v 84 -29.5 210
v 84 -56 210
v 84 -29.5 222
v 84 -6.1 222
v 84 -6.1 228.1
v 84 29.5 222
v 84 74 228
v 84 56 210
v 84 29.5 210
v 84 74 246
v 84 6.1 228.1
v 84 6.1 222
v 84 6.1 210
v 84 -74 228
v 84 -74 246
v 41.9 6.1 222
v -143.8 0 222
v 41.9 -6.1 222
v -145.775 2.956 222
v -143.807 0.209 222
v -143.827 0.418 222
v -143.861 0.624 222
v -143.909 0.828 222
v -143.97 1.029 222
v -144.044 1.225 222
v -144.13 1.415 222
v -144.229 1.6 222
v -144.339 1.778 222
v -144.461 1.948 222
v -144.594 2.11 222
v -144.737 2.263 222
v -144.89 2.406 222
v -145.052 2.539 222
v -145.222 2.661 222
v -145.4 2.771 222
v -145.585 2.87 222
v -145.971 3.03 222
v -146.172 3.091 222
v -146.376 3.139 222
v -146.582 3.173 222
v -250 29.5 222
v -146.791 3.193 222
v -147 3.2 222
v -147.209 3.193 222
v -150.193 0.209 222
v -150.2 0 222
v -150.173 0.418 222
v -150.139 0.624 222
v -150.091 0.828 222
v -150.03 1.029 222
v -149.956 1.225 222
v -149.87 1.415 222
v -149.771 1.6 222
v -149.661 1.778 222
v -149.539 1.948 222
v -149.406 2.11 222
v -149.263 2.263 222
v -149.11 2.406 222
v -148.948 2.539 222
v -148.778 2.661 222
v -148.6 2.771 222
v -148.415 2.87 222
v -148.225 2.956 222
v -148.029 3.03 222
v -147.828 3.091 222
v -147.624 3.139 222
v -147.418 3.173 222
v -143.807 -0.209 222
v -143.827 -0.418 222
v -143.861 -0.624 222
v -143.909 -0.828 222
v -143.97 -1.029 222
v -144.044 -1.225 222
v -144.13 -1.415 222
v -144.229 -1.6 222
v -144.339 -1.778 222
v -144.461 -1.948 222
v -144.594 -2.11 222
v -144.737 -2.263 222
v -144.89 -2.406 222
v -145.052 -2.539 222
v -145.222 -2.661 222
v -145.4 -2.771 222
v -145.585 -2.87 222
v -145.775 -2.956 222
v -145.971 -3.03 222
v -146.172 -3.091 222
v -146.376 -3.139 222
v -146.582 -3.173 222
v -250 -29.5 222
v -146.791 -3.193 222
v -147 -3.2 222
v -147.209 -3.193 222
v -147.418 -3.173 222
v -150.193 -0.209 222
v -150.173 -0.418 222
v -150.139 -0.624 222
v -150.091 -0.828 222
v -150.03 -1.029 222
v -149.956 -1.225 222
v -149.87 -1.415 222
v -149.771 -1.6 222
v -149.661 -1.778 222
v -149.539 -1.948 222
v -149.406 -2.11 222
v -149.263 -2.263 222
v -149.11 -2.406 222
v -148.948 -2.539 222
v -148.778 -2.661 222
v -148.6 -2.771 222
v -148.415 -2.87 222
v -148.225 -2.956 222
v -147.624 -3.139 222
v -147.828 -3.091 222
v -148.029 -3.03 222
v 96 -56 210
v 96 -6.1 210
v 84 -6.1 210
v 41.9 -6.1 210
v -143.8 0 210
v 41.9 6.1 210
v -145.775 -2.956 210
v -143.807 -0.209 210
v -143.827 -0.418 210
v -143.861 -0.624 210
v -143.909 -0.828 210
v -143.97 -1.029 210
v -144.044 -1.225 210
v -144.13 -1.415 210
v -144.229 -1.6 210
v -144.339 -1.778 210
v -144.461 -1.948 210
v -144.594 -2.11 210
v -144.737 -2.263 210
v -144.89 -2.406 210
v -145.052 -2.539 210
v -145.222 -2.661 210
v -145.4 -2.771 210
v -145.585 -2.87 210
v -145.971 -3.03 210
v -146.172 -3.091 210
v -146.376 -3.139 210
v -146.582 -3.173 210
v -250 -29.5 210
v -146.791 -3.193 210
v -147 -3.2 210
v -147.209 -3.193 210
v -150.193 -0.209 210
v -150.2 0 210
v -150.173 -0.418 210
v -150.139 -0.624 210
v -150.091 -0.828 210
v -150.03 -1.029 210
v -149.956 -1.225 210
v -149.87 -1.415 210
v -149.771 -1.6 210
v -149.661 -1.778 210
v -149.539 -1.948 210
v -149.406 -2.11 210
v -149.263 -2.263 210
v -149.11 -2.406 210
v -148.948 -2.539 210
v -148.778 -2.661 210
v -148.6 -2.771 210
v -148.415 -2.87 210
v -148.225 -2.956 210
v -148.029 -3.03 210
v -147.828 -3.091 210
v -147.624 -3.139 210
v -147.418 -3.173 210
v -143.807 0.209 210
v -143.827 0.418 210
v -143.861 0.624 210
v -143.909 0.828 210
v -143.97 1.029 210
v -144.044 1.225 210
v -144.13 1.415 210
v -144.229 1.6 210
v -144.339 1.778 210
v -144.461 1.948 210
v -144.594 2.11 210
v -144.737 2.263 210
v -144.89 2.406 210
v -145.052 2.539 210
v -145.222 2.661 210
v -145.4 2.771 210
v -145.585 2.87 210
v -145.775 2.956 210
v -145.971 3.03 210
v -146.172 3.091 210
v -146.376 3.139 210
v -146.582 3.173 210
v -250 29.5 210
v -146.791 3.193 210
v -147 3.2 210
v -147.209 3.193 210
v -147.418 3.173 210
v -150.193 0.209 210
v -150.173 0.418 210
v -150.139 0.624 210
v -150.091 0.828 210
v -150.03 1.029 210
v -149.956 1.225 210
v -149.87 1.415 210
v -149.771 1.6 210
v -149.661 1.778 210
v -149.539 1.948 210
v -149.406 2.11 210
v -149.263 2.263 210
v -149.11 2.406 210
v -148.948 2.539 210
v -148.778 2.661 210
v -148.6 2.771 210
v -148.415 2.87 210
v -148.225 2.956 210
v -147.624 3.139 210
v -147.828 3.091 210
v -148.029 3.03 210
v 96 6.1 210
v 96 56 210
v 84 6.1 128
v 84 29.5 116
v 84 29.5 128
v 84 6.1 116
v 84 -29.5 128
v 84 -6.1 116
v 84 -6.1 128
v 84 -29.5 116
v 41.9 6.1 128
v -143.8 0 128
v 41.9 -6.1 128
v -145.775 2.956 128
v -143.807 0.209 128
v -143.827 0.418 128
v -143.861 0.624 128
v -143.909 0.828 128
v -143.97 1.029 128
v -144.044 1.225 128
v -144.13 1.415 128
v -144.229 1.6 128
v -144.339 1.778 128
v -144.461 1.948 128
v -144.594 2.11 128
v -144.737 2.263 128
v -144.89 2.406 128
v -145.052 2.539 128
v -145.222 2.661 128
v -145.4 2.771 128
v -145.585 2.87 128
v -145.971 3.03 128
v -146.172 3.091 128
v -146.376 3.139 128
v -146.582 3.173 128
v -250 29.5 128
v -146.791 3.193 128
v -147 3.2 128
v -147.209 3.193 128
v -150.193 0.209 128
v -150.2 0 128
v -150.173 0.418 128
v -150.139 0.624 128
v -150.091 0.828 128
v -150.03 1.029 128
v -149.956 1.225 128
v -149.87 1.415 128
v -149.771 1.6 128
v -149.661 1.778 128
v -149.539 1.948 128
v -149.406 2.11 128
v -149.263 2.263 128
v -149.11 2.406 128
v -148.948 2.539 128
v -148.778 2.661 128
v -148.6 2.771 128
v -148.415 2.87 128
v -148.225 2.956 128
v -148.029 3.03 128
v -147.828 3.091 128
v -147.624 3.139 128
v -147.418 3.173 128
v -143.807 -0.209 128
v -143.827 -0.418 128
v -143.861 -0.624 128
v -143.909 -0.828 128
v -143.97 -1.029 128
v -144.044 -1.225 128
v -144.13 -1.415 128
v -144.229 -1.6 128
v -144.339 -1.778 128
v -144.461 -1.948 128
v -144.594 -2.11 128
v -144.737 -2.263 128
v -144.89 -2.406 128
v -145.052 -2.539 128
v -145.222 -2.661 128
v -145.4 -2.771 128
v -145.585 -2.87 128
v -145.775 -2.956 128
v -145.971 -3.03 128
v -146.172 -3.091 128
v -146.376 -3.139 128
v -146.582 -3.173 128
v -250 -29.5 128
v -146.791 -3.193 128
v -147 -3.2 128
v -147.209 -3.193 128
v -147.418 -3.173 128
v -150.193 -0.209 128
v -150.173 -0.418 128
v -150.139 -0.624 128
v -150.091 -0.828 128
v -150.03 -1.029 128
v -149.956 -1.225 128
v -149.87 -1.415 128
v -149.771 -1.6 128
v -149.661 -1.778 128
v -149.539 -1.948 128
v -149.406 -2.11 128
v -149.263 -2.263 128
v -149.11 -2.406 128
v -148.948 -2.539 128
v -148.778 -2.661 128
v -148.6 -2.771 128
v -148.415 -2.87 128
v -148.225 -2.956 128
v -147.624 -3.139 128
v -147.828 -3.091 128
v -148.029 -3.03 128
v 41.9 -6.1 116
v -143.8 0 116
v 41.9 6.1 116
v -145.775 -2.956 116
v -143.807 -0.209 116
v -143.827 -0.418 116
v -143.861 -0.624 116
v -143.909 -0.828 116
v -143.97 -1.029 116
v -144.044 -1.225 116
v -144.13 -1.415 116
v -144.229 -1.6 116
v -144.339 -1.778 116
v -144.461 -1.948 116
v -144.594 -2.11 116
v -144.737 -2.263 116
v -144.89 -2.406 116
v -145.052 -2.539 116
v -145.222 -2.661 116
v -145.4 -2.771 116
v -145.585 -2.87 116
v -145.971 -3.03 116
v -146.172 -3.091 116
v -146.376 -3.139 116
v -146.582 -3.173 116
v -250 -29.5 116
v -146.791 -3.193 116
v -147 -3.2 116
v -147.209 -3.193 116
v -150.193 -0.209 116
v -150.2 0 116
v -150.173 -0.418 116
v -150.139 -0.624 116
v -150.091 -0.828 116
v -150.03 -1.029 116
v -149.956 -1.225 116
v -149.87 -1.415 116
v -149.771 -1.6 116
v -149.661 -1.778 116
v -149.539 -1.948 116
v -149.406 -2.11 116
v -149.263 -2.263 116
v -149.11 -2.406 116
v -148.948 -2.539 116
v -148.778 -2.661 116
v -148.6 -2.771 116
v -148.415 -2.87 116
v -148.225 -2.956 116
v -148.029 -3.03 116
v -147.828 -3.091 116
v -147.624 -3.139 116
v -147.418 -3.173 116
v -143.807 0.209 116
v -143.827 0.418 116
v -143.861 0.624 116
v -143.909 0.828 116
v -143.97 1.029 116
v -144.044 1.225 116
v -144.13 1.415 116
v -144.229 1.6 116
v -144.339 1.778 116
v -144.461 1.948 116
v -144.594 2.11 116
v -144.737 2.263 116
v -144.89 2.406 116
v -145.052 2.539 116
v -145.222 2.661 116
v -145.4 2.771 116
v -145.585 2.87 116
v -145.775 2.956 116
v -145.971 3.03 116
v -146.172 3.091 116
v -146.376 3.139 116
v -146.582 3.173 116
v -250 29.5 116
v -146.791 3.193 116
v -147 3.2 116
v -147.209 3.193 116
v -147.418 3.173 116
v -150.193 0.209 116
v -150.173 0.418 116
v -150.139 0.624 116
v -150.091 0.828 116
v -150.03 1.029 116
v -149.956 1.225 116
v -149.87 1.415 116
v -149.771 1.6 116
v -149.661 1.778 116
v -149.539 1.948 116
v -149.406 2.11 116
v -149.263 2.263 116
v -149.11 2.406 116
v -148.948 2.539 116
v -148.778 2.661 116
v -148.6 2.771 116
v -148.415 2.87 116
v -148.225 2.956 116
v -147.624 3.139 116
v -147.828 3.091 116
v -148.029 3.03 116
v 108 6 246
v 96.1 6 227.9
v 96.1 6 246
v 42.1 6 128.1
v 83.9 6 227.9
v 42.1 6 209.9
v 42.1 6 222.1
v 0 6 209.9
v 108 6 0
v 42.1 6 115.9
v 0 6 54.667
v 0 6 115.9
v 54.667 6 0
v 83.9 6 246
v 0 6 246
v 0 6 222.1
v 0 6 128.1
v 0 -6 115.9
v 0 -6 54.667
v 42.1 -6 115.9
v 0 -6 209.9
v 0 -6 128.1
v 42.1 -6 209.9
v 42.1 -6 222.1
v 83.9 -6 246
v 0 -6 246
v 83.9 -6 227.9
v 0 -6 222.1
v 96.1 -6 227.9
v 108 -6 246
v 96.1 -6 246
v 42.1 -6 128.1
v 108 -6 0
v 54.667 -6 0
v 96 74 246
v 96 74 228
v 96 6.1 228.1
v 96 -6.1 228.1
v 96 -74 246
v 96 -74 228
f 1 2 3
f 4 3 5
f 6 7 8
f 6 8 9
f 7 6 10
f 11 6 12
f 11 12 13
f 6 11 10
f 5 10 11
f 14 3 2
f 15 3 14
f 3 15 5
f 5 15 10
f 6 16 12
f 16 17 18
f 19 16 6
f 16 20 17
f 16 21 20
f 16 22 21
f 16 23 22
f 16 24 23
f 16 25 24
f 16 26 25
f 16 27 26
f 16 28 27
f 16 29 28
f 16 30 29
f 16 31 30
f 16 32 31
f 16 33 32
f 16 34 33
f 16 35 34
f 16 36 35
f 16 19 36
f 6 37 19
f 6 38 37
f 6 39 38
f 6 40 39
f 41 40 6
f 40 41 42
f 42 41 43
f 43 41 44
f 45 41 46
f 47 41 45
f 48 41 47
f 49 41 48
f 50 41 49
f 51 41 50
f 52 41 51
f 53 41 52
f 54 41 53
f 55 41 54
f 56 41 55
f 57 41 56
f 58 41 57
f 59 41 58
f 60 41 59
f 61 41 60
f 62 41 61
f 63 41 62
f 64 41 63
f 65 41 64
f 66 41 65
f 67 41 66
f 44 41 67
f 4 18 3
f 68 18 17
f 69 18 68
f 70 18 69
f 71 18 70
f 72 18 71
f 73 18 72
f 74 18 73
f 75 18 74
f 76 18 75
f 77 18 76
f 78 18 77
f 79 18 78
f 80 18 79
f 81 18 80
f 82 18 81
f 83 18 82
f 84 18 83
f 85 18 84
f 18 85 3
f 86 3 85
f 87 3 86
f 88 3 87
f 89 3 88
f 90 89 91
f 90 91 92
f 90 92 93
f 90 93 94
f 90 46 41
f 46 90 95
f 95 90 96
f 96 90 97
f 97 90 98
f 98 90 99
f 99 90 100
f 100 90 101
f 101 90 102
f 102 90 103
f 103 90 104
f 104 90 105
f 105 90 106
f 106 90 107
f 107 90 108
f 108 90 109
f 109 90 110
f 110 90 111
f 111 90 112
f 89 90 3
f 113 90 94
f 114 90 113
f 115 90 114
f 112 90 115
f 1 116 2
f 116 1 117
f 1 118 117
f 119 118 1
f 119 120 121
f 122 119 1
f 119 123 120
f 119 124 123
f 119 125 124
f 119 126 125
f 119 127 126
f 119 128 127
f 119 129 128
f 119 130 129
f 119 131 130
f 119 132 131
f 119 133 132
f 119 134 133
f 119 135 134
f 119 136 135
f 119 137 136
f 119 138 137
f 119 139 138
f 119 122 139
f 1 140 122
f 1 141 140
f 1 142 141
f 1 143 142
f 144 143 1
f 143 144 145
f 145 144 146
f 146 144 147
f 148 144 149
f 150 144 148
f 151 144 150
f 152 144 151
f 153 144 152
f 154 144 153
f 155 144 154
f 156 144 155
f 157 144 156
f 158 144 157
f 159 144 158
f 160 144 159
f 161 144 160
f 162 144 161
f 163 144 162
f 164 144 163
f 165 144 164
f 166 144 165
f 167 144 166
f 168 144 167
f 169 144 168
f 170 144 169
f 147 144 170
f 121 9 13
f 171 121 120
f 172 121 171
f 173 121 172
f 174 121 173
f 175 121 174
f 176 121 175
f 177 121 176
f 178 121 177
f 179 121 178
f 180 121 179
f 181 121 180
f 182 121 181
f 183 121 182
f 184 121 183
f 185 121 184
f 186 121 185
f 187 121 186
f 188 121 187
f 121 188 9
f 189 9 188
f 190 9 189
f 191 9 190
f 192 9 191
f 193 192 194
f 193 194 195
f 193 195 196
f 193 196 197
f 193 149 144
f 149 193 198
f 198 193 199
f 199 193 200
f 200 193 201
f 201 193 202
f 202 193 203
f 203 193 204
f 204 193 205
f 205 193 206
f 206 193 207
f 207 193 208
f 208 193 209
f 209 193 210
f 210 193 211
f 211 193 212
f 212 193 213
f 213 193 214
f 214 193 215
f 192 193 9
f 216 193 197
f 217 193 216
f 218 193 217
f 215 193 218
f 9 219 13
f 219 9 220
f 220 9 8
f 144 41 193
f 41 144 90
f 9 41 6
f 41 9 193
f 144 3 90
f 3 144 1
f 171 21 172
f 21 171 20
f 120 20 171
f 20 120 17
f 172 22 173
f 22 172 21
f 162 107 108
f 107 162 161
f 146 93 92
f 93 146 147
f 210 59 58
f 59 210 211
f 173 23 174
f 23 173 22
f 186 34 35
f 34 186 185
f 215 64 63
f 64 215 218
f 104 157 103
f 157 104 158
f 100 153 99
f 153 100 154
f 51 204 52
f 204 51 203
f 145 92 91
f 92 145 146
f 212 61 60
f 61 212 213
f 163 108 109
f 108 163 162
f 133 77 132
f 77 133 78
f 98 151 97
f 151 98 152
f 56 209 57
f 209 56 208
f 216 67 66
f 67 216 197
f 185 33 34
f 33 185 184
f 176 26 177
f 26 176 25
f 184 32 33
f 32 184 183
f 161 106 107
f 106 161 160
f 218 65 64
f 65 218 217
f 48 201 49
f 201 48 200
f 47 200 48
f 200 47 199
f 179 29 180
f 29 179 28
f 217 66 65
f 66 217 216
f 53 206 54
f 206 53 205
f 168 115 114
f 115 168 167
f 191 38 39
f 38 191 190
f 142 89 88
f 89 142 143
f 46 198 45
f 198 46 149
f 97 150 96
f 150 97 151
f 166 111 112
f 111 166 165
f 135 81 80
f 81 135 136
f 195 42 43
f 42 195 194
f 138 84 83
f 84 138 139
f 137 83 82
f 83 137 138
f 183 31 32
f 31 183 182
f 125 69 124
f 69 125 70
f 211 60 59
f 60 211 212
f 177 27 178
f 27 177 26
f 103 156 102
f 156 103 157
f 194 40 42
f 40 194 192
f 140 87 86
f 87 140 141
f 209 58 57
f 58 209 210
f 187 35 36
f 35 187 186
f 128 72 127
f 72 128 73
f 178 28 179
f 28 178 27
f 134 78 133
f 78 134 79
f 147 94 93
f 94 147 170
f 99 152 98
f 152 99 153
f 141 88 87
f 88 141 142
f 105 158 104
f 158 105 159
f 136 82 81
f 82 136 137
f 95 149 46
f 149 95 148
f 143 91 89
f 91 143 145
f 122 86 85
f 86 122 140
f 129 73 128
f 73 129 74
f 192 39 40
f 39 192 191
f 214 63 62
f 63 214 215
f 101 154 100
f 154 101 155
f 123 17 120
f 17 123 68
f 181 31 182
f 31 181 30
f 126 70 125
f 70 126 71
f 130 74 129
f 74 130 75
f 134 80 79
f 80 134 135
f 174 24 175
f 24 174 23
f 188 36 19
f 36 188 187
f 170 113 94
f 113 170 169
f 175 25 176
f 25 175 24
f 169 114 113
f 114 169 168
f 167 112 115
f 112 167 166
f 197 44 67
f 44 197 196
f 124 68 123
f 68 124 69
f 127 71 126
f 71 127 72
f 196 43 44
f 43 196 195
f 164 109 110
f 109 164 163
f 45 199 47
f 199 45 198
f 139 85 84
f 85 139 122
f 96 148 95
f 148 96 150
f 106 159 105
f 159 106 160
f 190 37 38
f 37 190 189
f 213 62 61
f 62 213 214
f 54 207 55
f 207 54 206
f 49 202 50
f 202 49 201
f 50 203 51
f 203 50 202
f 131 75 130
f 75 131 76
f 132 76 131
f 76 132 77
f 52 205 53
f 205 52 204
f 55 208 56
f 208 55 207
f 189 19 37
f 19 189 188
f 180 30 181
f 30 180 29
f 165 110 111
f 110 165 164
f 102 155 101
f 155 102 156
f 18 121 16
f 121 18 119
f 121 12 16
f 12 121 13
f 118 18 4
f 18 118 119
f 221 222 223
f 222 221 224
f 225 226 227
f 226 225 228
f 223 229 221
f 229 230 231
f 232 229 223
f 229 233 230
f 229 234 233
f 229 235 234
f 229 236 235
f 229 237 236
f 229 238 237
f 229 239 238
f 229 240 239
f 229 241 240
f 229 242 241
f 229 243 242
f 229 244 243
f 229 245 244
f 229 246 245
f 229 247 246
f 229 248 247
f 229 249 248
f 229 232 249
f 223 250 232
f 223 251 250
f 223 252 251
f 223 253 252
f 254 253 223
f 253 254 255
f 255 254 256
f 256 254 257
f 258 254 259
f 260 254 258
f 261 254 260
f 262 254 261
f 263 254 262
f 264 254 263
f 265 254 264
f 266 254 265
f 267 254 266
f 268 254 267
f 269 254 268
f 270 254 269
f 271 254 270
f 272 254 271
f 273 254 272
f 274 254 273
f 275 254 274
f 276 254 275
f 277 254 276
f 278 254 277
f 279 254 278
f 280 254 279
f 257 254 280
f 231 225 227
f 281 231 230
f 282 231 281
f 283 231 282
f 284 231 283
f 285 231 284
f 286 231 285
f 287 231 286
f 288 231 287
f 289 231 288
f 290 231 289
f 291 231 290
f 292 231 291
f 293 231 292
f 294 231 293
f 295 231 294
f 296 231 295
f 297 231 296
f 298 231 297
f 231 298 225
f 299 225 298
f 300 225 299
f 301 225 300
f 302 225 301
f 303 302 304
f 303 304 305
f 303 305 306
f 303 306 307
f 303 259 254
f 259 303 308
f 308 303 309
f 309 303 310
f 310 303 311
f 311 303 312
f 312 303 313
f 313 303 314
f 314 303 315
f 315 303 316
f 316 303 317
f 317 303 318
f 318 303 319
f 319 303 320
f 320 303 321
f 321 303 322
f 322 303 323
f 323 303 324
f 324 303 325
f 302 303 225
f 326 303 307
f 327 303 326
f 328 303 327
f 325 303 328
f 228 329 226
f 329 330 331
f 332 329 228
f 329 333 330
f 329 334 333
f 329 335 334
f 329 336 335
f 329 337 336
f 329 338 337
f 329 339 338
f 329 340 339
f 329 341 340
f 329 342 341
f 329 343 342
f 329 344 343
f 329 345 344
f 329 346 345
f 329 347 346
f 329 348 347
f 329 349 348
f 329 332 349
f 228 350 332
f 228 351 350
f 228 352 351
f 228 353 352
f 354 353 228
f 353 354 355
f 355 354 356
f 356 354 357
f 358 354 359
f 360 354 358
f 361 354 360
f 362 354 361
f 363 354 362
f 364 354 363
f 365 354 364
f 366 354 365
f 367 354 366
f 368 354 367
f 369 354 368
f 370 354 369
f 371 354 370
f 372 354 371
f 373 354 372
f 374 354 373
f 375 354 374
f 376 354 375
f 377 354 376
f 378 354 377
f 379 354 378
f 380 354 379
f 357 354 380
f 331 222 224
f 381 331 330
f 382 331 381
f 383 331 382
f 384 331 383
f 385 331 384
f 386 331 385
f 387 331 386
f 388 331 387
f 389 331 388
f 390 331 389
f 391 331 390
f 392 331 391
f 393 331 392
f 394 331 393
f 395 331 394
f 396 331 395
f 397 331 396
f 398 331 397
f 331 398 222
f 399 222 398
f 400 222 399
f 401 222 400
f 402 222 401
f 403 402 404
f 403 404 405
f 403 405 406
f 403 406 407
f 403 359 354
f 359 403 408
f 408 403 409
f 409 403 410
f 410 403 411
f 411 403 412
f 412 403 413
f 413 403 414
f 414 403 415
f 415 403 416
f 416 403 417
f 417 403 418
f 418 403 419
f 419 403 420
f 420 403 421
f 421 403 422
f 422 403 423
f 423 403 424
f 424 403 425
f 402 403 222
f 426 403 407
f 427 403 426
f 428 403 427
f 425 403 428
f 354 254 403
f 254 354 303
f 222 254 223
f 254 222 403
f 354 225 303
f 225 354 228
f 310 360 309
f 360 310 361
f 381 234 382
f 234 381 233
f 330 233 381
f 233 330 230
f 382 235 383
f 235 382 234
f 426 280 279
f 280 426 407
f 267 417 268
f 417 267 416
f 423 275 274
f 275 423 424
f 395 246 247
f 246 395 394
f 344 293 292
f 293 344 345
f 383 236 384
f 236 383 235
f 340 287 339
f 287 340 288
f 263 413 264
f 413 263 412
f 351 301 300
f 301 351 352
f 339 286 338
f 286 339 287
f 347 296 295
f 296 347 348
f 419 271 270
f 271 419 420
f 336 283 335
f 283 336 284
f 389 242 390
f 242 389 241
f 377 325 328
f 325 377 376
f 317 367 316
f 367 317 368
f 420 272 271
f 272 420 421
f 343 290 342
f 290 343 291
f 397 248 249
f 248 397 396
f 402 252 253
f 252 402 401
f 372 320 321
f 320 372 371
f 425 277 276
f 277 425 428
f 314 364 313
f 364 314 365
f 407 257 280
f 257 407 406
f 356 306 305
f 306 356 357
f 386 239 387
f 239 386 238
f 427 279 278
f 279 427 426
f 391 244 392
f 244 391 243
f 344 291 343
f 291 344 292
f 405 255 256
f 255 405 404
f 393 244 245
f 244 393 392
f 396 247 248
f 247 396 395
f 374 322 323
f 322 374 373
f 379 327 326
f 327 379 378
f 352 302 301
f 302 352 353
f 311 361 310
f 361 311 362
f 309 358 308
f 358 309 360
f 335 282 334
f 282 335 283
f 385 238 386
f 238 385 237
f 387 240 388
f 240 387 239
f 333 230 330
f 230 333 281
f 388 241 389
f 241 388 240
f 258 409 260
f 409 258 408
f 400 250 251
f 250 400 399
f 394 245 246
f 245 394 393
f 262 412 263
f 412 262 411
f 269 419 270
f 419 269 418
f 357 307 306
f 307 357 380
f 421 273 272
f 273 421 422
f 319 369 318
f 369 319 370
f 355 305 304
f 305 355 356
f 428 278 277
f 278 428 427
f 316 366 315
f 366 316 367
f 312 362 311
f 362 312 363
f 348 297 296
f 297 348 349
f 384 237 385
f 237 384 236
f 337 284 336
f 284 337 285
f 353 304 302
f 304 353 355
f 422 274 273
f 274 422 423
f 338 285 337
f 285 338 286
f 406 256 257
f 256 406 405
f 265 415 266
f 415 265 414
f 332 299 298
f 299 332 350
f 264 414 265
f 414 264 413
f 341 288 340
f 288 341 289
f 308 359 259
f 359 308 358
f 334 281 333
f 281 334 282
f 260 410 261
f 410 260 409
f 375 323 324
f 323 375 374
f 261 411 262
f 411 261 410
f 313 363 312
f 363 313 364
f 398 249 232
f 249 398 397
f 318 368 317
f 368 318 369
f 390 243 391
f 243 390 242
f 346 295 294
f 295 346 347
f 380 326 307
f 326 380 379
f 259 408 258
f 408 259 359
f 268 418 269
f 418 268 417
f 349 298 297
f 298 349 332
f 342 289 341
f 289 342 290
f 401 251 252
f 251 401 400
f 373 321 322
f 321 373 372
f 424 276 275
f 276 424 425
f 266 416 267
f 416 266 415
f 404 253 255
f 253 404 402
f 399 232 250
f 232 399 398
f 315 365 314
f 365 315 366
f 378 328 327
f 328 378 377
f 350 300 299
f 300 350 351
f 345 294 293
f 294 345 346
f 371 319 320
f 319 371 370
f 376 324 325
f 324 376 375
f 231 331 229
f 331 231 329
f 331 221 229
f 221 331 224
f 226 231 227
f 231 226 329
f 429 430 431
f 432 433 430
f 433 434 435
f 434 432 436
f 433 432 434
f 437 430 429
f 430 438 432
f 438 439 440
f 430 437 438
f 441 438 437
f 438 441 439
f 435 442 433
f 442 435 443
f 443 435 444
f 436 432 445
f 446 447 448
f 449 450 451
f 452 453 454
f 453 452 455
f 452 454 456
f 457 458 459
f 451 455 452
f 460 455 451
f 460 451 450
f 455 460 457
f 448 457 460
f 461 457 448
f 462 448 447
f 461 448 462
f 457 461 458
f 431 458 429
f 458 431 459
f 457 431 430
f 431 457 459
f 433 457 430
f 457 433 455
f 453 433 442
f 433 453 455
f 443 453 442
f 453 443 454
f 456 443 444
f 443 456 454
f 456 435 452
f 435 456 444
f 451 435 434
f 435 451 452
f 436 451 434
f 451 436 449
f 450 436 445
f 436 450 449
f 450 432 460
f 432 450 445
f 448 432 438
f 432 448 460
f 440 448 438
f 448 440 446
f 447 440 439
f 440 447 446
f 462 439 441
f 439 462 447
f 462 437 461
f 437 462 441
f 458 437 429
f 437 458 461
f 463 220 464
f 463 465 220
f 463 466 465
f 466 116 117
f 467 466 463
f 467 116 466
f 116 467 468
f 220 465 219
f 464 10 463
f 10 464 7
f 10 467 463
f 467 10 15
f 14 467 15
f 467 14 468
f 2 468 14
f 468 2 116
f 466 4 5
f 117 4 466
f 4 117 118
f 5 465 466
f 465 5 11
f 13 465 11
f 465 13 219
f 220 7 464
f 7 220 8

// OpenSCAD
// ==========================================================================
//  GENERATED FILE -- DO NOT EDIT.
//  Produced by build/build.py from components/Turtle_Rear_Fin_v2.scad
//  Turtle Body version 1.6.0
//  Edit lib/ and src/ instead, then run: python3 build/build.py
// ==========================================================================
/*
 Hope Turtle rear-fin v2. Units: mm. License: CERN-OHL-S-2.0.
 Four wooden pieces: yellow fin, two green bottle-holder shafts, red solar
 crossbar. Panel + bottle are F5 reference only, excluded from F6/STL.
 Shaft length 334. Slot openings 12.2 mm (0.2 mm TOTAL, centred).
 TB-07: green-slat mounting hole is 103 mm from the shaft front, matching
 the assembled Turtle (was a fixed 50 mm).

 SOURCE FILE — geometry lives in lib/rear_fin.scad + lib/params.scad.
 The committed self-contained file is generated by build/build.py.
*/

/* [Fit and tuning] */
half_lap_clearance   = 0.2; // TOTAL extra slot width, centred on the board
solar_slot_clearance = 0.2;
exploded = 0;

/* [Display] */
part = "assembly"; // [assembly,fin,solar_holder,shaft]
show_solar_panel = true;   // F5 reference only, excluded from F6/STL
show_bottle_mockup = false; // reserved

/* [Render] */
fn = 96;

// [bundle] begin use <../../lib/rear_fin.scad>
// ==========================================================================
//  Turtle Body -- rear fin + solar-panel support  (lib module)
// --------------------------------------------------------------------------
//  One yellow vertical fin, two green bottle-holder shafts, one red solar
//  crossbar. In the standalone the panel + bottle are %-reference only and
//  excluded from F6/STL. See CLAUDE.md s11.
//
//  Shaft length keeps the approved formula 305 + (2/3)(93-24) - 17 = 334.
//  Half-lap and solar-joint clearances are 0.2 mm TOTAL, centred on the
//  12 mm board (slot opening 12.2 mm, not 12.4). TB-07: the green-slat
//  mounting hole is p_rear_shaft_hole_from_front() (103 mm at defaults),
//  matching the assembled Turtle -- not the old fixed 50 mm.
//
//  Definitions only. Geometry is emitted by rear_fin_assembly() or the
//  individual part modules.
// ==========================================================================

// [bundle] begin use <params.scad>
// ==========================================================================
//  Turtle Body -- shared dimension contract
// --------------------------------------------------------------------------
//  The single source of truth for every dimension that more than one
//  subsystem depends on. Values are exposed as zero-argument functions so
//  this file can be pulled in with `use <params.scad>` (which ignores
//  top-level variable assignments) without polluting any namespace.
//
//  lib/ modules take these as DEFAULT argument values:
//      module control_cap(roof_t = p_cap_roof_t(), ...) { ... }
//  so a src/ wrapper can still override one value from its customizer block
//  while every other subsystem keeps the shared number.
//
//  Rules:
//   * one function per concept, canonical name (see CLAUDE.md cross-file table)
//   * derived values are functions of other p_*() functions, never re-typed
//   * mm throughout; names say _d (diameter), _r (radius), _t (thickness),
//     _len / _h (axial), _af (hex across-flats)
//   * do NOT add a bare `x = ...;` here -- bundle.py / lint.py will reject it
// ==========================================================================

// ---- tolerances and render quality --------------------------------------
function p_eps()          = 0.02;   // Boolean overlap / cut-through fudge
function p_fit_clearance() = 0.2;   // wood joint: TOTAL extra slot width, centred on the board
function p_fn_plastic()   = 120;    // printed PLA parts (cap, cage, axle, mold)
function p_fn_wood()      = 96;     // cut wooden parts
function p_fn_curve()     = 180;    // fine profile curves (bottle, sails)

// ---- bottle (the foundation reference) ---------------------------------
function p_bottle_d()        = 82;    // outside diameter
function p_bottle_h()        = 305;   // total height incl. ordinary screw cap
function p_bottle_wall_t()   = 0.5;   // modelling assumption, not a measurement
function p_bottle_cap_d()    = 31;    // ordinary screw cap (NOT the control-cap disk)
function p_bottle_cap_h()    = 17;    // ordinary screw cap height (rear-fin / ballast formulas)
function p_collar_d()        = 34;    // bottle collar, independent of cap diameter
function p_top_dome_h()      = 62;
function p_bottom_dome_h()   = 25;
function p_dome_power()      = 2.5;   // superellipse exponent
function p_bottle_neck_h()   = 5;
function p_bottle_collar_h() = 1;
function p_bottle_neck_d()   = p_bottle_cap_d() - 3;   // 28: neck is 3 mm under the cap
function p_bottle_base_ratio() = 0.88; // slightly narrower footprint at the base
function p_bottle_profile_steps() = 16;
// cut bottle (control head): the lower dome is removed and a short socket is
// bored so the control-cap insert slides in. Cut plane sits 5 mm above the
// bottom dome height.
function p_bottle_cut_extra()  = 5;
function p_bottle_cut_height() = p_bottom_dome_h() + p_bottle_cut_extra();   // 30

// nominal bottle interior and the cap insert that enters it
function p_bottle_socket_d() = p_bottle_d() - 2 * p_bottle_wall_t();          // 81
function p_insert_shaft_radial_clearance() = 1;
function p_insert_shaft_d()  = p_bottle_socket_d()
                             - 2 * p_insert_shaft_radial_clearance();          // 79

// ---- wooden stock -----------------------------------------------------
function p_wood_t()          = 12;    // shared board / slat thickness
function p_fin_board_w()     = 93;    // shared fin-system stock width
function p_screw_side_offset() = 25;  // mounting-hole inset from a John end

// ---- Ecojoiner port --------------------------------------------------
function p_port_length()     = 82;                 // axial length of a port
function p_port_height()     = p_bottle_d();       // opening height == bottle diameter (asserted)

// ---- M6 hardware ---------------------------------------------------
function p_m6_clearance_d()  = 6.4;   // M6 clearance hole
function p_m6_bolt_shaft_d() = 6;     // visual placeholder only
function p_m6_bolt_head_d()  = 12;
function p_m6_bolt_head_t()  = 4;

// ---- control cap (large stationary disk; see CLAUDE.md s7) ----------
//  TB-03 resolution: repository 5 mm roof / 2 mm boss is authoritative;
//  the axle (below) is derived to this datum.
function p_cap_disk_d()      = 100;   // control-cap disk (independent of p_bottle_cap_d)
function p_cap_roof_t()      = 5;     // disk / roof thickness
function p_cap_boss_depth()  = 2;     // extra projection of the centre boss into the hollow cap
function p_cap_boss_d()      = 18;
function p_cap_insert_len()  = 35;    // straight insert shaft length
function p_cap_insert_wall_t() = 4;
function p_cap_entry_chamfer_h()     = 1;
function p_cap_entry_chamfer_delta() = 1;
function p_cap_axle_bore_d() = 8.6;   // 0.3 mm radial clearance to the Ø8 shaft
function p_cap_cage_radial_clearance() = 1;   // cap disk -> cage inner wall (radial)
function p_cap_total_h()     = p_cap_roof_t() + p_cap_insert_len();           // 40
function p_cap_bearing_len() = p_cap_roof_t() + p_cap_boss_depth();           // 7

// buttons (through both cap and cage)
function p_button_upper_d()  = 17;    // clearance hole in the cap
function p_button_axis()     = "y";   // "x" or "y"
function p_button_radius()   = 24;    // radial position of the two button centres (48 mm apart)

// ---- silicone seal grooves + rings (CLAUDE.md s8) ------------------
function p_seal_groove_count()      = 2;
function p_seal_groove_axial_h()    = 2;   // groove height
function p_seal_groove_radial_depth() = 2; // groove depth
function p_seal_groove1_from_shoulder() = 12;  // groove centre, measured from the insert SHOULDER
function p_seal_groove2_from_shoulder() = 25;
function p_seal_ring_axial_t()      = 1.5;  // cast ring thickness
function p_seal_ring_radial_w()     = 5;    // NOT validated; 3.5 was a suggested milder prototype
function p_seal_groove_root_d() = p_insert_shaft_d()
                                - 2 * p_seal_groove_radial_depth();            // 75

// ---- round / hex centre axle (CLAUDE.md s9) -----------------------
//  Derived to the 5/2 cap datum (TB-03/TB-04). round_inside_cap is measured
//  from the roof underside and INCLUDES the boss -- do not add the boss again.
function p_axle_round_d()        = 8;
function p_axle_round_ext()      = 1;    // projection above the cap's outer face
function p_axle_round_inside_cap() = p_cap_insert_len() - 5;  // 30: roof underside to round end (incl. boss)
function p_axle_round_len()      = p_axle_round_inside_cap() + p_cap_roof_t() + p_axle_round_ext();  // 36
function p_axle_hex_af()         = 10.0; // shaft across-flats (0.3 mm to the Ø10.3 cage bore)
function p_axle_hex_len()        = 23;
function p_axle_join_overlap()   = 0.2;  // hex<->round Boolean overlap
function p_axle_total_len()      = p_axle_hex_len() + p_axle_round_len();
function p_axle_hex_corner_d()   = p_axle_hex_af() / cos(30);                  // ~11.55
function p_magnet_d()            = 3;    // AS5600 sensing magnet recess
function p_magnet_t()            = 1;

// ---- axle rotary shaft O-ring (waterproofs the axle bore; cast in the mold) ----
//  A round-section O-ring seated in a gland in the control-cap bore, sealing
//  against the spinning round section of the axle. ID is tied to the shaft.
function p_axle_oring_cs()     = 2.0;                                   // cross-section
function p_axle_oring_id()     = p_axle_round_d();                      // 8 -- hugs the shaft
function p_axle_oring_od()     = p_axle_oring_id() + 2 * p_axle_oring_cs();          // 12
function p_axle_oring_mean_r() = (p_axle_oring_id() + p_axle_oring_cs()) / 2;        // 5
//  gland cut into the cap bore for it
function p_cap_oring_squeeze()      = 0.25;  // radial squeeze on the seal
function p_cap_oring_gland_od()     = p_axle_oring_od() - 2 * p_cap_oring_squeeze(); // 11.5
function p_cap_oring_gland_w()      = 1.3 * p_axle_oring_cs();                       // 2.6 axial
function p_cap_oring_gland_from_face() = 3.5; // gland centre, from the cap outer face, along the bore

// ---- rotating control cage (CLAUDE.md s6) ------------------------
function p_cage_wall_t()     = 6.5;   // radial wall thickness
function p_cage_roof_t()     = 6;     // roof / surface plate thickness
function p_cage_inner_d()    = p_cap_disk_d() + 2 * p_cap_cage_radial_clearance();   // 102
function p_cage_outer_d()    = p_cage_inner_d() + 2 * p_cage_wall_t();               // 115
function p_cage_skirt_depth()   = 44;   // roof underside to the ORIGINAL skirt rim
function p_cage_peak_extension() = 20;  // crest extends this far past the original rim
function p_cage_valley_wall_h()  = 10;  // minimum wall depth between mounts
function p_cage_total_h()    = p_cage_skirt_depth() + p_cage_roof_t();              // 50 (native)
function p_cage_notch_count()   = 4;
function p_cage_notch_w()    = 22.5;  // batten groove width
function p_cage_notch_depth() = 3.7;
function p_cage_wave_segments() = 240;
function p_cage_hub_d()      = 29;
function p_cage_pocket_d()   = 26;    // top clip pocket
function p_cage_pocket_depth() = 4;
function p_cage_hex_bore_af() = 10.3; // central hex bore (0.3 mm to the Ø10.0 shaft)
function p_cage_bearing_d()  = 9;     // hemispherical bearing bump
function p_cage_bearing_count() = 8;
function p_cage_bearing_pcd() = p_cap_disk_d() - p_cage_bearing_d() + 0.5;          // 91.5
function p_cage_top_hole_d() = 18;    // central button / access hole through the roof
function p_cage_mount_hole_d() = 3.2; // two M3 clearance holes per batten / groove
function p_cage_mount_pitch()  = 32;  // vertical pitch of the pair
function p_cage_lower_hole_from_tip() = 10;
// 45-deg outward chamfer on the roof-top outer edge (0 = sharp). The cage
// prints roof-face-down, so this bevel flares OUT from the bed and stays
// printable; it is masked away around each batten groove. See lib/control_cage.scad.
function p_cage_roof_bevel() = 4;

// ---- sail apparatus (CLAUDE.md s10) ---------------------------
function p_side_batten_h()   = 205;
function p_side_batten_w()   = 20;
function p_side_batten_radial_t() = 10;
function p_top_crossbar_len() = 6 * p_bottle_d();   // 492
function p_top_crossbar_w()  = 22;
function p_top_crossbar_t()  = p_wood_t();          // 12
function p_sail_bar_axle_hole_d() = 12;             // Ø12; fits the ~11.55 hex corner dia
function p_bottom_rail_len() = 3 * p_bottle_d();    // 246
function p_bottom_rail_bottle_clearance() = 1;
function p_sail_rail_color()  = [0.56, 0.39, 0.39]; // brown (top AND bottom rails)
function p_c_piece_color()    = [1.0, 0.52, 0.20];  // orange, retained

// ---- rear fin + solar support (CLAUDE.md s11) ----------------
function p_solar_panel_w() = 148;
function p_solar_panel_h() = 223;
function p_solar_panel_t() = 2.5;    // real panel, independent of wood thickness
function p_rear_shaft_len() = p_bottle_h()
                            + (2/3) * (p_fin_board_w() - 2 * p_wood_t())
                            - p_bottle_cap_h();                                 // 334
function p_rear_half_lap_engagement() = 42;   // green/yellow interlock depth
function p_rear_fin_tab_width() = 15;
function p_rear_shaft_width()   = 59;
// TB-07: the green-slat mounting hole follows the mating Ecojoiner John, not a
// fixed 50 mm. Derived from the install transform; the john_length/2 terms
// cancel, leaving a pure function of the shared contract (= 103 at defaults).
function p_rear_shaft_hole_from_front() =
    p_rear_shaft_len() - p_screw_side_offset() - p_bottle_h()
    + p_bottle_cap_h() + p_port_height();

// ---- ballast attachment (CLAUDE.md s12) ---------------------
function p_ballast_core_w()   = p_bottle_d() - 2 * p_wood_t();                  // 58
function p_ballast_core_len() = p_bottle_h() - p_bottle_cap_h() + 6 * p_wood_t();  // 360
function p_ballast_slat_gap() = p_bottle_d();          // clear inner-face gap
function p_ballast_slat_spacing() = p_bottle_d() + p_wood_t();                  // 94
function p_ballast_board_len() = 3.5 * p_bottle_d();   // 287
function p_ballast_fin_len()   = 3 * p_bottle_d();     // 246
function p_ballast_lock_w()    = 5 * p_wood_t();       // 60
// [bundle] end   <params.scad>

function rf_t()             = p_wood_t();
function rf_fin_width()     = p_fin_board_w() + p_rear_fin_tab_width();          // 108
function rf_fin_height()    = 3 * p_bottle_d();                                  // 246
function rf_diag()          = (2/3) * p_bottle_d();                              // 54.667
function rf_shaft_length()  = p_rear_shaft_len();                               // 334
function rf_shaft_width()   = p_rear_shaft_width();                             // 59
function rf_solar_holder_len() = p_solar_panel_w();                            // 148
function rf_solar_holder_h()   = 3 * rf_t();                                    // 36
function rf_solar_chamfer()    = 1.5 * rf_t();                                  // 18
function rf_solar_slot_depth() = rf_solar_holder_h() / 2;                       // 18
function rf_solar_notch_x0()   = rf_fin_width() - 2 * rf_t();                    // 84
function rf_shaft_rear_x()     = rf_solar_notch_x0();                            // 84
function rf_shaft_front_x()    = rf_shaft_rear_x() - rf_shaft_length();
function rf_joint_meet_x()     = rf_shaft_rear_x() / 2;
function rf_upper_shaft_z0()   = rf_fin_height() - 3 * rf_t();
function rf_lower_shaft_z0()   = rf_upper_shaft_z0() - p_bottle_d() - rf_t();
function rf_solar_meet_z()     = rf_upper_shaft_z0() + rf_solar_slot_depth();

module rf_assert_valid(half_lap, solar_clear, hole_from_front, hole_d) {
    t = rf_t();
    assert(t > 0 && p_bottle_h() > p_bottle_cap_h() && p_bottle_cap_d() > 0);
    assert(p_bottle_d() > 0 && p_fin_board_w() > 2 * t && p_rear_fin_tab_width() > 0);
    assert(p_solar_panel_w() > 0 && p_solar_panel_h() > 0 && p_solar_panel_t() > 0);
    assert(half_lap >= 0 && solar_clear >= 0);
    assert(rf_shaft_front_x() < 0 && rf_joint_meet_x() > half_lap / 2);
    assert(rf_shaft_width() > t + half_lap);
    assert(half_lap < t && half_lap < p_bottle_d());
    assert(rf_lower_shaft_z0() - half_lap / 2 >= rf_diag(),
           "rear_fin: lower joint intersects the diagonal fin edge.");
    assert(rf_fin_width() > rf_diag());
    assert(solar_clear < t && rf_solar_notch_x0() > solar_clear / 2);
    assert(2 * rf_solar_chamfer() + t + solar_clear < rf_solar_holder_len(),
           "rear_fin: panel width leaves too little red-board material beside the slot.");
    assert(hole_d > 0 && rf_shaft_width() > hole_d);
    assert(hole_from_front > hole_d / 2
           && rf_shaft_front_x() + hole_from_front + hole_d / 2 < 0,
           "rear_fin: shaft hole must stay in the forward, unjointed portion.");
}

module rear_fin(half_lap = p_fit_clearance(), solar_clear = p_fit_clearance(),
                fn = undef) {
    t = rf_t(); eps = p_eps();
    nn = fn == undef ? p_fn_wood() : fn;
    color([1, 0.72, 0.05]) rotate([90, 0, 0])
        linear_extrude(height = t, center = true, $fn = nn) difference() {
            polygon([[0, rf_diag()], [rf_diag(), 0],
                     [rf_fin_width(), 0], [rf_fin_width(), rf_fin_height()],
                     [0, rf_fin_height()]]);
            for (z = [rf_upper_shaft_z0(), rf_lower_shaft_z0()])
                translate([-eps, z - half_lap / 2])
                    square([rf_joint_meet_x() + half_lap / 2 + eps, t + half_lap]);
            translate([rf_solar_notch_x0() - solar_clear / 2,
                       rf_solar_meet_z() - solar_clear / 2])
                square([t + solar_clear,
                        rf_fin_height() - rf_solar_meet_z() + solar_clear / 2 + eps]);
        }
}

module bottle_holder_shaft(z0 = 0, half_lap = p_fit_clearance(),
                           hole_from_front = undef, hole_d = undef, fn = undef) {
    t = rf_t(); eps = p_eps();
    nn  = fn == undef ? p_fn_wood() : fn;
    hff = hole_from_front == undef ? p_rear_shaft_hole_from_front() : hole_from_front;
    hd  = hole_d == undef ? p_m6_clearance_d() : hole_d;
    color([0.2, 0.38, 0.05]) difference() {
        translate([rf_shaft_front_x(), -rf_shaft_width() / 2, z0])
            cube([rf_shaft_length(), rf_shaft_width(), t]);
        translate([rf_shaft_front_x() + hff, 0, z0 - eps])
            cylinder(d = hd, h = t + 2 * eps, $fn = nn);
        translate([rf_joint_meet_x() - half_lap / 2, -(t + half_lap) / 2, z0 - eps])
            cube([rf_shaft_rear_x() - rf_joint_meet_x() + half_lap / 2 + eps,
                  t + half_lap, t + 2 * eps]);
    }
}

module solar_panel_holder(solar_clear = p_fit_clearance(), fn = undef) {
    t = rf_t(); eps = p_eps();
    nn = fn == undef ? p_fn_wood() : fn;
    L = rf_solar_holder_len(); H = rf_solar_holder_h(); ch = rf_solar_chamfer();
    color("red") translate([rf_solar_notch_x0(), 0, rf_upper_shaft_z0()])
        rotate([90, 0, 90]) translate([-L / 2, 0, 0])
            linear_extrude(height = t, $fn = nn) difference() {
                square([L, H]);
                polygon([[0, 0], [ch, 0], [0, ch]]);
                polygon([[L, 0], [L - ch, 0], [L, ch]]);
                translate([(L - t - solar_clear) / 2, -eps])
                    square([t + solar_clear, rf_solar_slot_depth() + solar_clear / 2 + eps]);
            }
}

module rear_fin_assembly(half_lap = p_fit_clearance(), solar_clear = p_fit_clearance(),
                         exploded = 0, fn = undef) {
    rf_assert_valid(half_lap, solar_clear,
                    p_rear_shaft_hole_from_front(), p_m6_clearance_d());
    rear_fin(half_lap, solar_clear, fn);
    translate([-exploded, 0,  exploded]) bottle_holder_shaft(rf_upper_shaft_z0(), half_lap, fn = fn);
    translate([-exploded, 0, -exploded]) bottle_holder_shaft(rf_lower_shaft_z0(), half_lap, fn = fn);
    translate([ exploded, 0,  exploded]) solar_panel_holder(solar_clear, fn);

    echo("REAR FIN: shaft length = ", rf_shaft_length(),
         " | hole from front (TB-07) = ", p_rear_shaft_hole_from_front(),
         " | slot opening = ", rf_t() + half_lap);
}
// [bundle] end   <../../lib/rear_fin.scad>
// [bundle] begin use <../../lib/params.scad>
// [bundle] already inlined: params.scad
// [bundle] end   <../../lib/params.scad>

module _panel_reference() {
    // width -> Y, height/length -> X, thickness -> Z; extends forward from the crossbar
    x0 = rf_solar_notch_x0() + p_wood_t() - p_solar_panel_h();
    color([0.05, 0.16, 0.4, 0.65])
        translate([x0, -p_solar_panel_w() / 2, rf_fin_height()])
            cube([p_solar_panel_h(), p_solar_panel_w(), p_solar_panel_t()]);
}

if (part == "assembly") {
    rear_fin_assembly(half_lap = half_lap_clearance,
                      solar_clear = solar_slot_clearance,
                      exploded = exploded, fn = fn);
    if (show_solar_panel && exploded == 0) %_panel_reference();
} else if (part == "fin") {
    rear_fin(half_lap = half_lap_clearance, solar_clear = solar_slot_clearance, fn = fn);
} else if (part == "solar_holder") {
    solar_panel_holder(solar_clear = solar_slot_clearance, fn = fn);
} else if (part == "shaft") {
    bottle_holder_shaft(half_lap = half_lap_clearance, fn = fn);
} else {
    assert(false, str("Unknown part: ", part));
}
